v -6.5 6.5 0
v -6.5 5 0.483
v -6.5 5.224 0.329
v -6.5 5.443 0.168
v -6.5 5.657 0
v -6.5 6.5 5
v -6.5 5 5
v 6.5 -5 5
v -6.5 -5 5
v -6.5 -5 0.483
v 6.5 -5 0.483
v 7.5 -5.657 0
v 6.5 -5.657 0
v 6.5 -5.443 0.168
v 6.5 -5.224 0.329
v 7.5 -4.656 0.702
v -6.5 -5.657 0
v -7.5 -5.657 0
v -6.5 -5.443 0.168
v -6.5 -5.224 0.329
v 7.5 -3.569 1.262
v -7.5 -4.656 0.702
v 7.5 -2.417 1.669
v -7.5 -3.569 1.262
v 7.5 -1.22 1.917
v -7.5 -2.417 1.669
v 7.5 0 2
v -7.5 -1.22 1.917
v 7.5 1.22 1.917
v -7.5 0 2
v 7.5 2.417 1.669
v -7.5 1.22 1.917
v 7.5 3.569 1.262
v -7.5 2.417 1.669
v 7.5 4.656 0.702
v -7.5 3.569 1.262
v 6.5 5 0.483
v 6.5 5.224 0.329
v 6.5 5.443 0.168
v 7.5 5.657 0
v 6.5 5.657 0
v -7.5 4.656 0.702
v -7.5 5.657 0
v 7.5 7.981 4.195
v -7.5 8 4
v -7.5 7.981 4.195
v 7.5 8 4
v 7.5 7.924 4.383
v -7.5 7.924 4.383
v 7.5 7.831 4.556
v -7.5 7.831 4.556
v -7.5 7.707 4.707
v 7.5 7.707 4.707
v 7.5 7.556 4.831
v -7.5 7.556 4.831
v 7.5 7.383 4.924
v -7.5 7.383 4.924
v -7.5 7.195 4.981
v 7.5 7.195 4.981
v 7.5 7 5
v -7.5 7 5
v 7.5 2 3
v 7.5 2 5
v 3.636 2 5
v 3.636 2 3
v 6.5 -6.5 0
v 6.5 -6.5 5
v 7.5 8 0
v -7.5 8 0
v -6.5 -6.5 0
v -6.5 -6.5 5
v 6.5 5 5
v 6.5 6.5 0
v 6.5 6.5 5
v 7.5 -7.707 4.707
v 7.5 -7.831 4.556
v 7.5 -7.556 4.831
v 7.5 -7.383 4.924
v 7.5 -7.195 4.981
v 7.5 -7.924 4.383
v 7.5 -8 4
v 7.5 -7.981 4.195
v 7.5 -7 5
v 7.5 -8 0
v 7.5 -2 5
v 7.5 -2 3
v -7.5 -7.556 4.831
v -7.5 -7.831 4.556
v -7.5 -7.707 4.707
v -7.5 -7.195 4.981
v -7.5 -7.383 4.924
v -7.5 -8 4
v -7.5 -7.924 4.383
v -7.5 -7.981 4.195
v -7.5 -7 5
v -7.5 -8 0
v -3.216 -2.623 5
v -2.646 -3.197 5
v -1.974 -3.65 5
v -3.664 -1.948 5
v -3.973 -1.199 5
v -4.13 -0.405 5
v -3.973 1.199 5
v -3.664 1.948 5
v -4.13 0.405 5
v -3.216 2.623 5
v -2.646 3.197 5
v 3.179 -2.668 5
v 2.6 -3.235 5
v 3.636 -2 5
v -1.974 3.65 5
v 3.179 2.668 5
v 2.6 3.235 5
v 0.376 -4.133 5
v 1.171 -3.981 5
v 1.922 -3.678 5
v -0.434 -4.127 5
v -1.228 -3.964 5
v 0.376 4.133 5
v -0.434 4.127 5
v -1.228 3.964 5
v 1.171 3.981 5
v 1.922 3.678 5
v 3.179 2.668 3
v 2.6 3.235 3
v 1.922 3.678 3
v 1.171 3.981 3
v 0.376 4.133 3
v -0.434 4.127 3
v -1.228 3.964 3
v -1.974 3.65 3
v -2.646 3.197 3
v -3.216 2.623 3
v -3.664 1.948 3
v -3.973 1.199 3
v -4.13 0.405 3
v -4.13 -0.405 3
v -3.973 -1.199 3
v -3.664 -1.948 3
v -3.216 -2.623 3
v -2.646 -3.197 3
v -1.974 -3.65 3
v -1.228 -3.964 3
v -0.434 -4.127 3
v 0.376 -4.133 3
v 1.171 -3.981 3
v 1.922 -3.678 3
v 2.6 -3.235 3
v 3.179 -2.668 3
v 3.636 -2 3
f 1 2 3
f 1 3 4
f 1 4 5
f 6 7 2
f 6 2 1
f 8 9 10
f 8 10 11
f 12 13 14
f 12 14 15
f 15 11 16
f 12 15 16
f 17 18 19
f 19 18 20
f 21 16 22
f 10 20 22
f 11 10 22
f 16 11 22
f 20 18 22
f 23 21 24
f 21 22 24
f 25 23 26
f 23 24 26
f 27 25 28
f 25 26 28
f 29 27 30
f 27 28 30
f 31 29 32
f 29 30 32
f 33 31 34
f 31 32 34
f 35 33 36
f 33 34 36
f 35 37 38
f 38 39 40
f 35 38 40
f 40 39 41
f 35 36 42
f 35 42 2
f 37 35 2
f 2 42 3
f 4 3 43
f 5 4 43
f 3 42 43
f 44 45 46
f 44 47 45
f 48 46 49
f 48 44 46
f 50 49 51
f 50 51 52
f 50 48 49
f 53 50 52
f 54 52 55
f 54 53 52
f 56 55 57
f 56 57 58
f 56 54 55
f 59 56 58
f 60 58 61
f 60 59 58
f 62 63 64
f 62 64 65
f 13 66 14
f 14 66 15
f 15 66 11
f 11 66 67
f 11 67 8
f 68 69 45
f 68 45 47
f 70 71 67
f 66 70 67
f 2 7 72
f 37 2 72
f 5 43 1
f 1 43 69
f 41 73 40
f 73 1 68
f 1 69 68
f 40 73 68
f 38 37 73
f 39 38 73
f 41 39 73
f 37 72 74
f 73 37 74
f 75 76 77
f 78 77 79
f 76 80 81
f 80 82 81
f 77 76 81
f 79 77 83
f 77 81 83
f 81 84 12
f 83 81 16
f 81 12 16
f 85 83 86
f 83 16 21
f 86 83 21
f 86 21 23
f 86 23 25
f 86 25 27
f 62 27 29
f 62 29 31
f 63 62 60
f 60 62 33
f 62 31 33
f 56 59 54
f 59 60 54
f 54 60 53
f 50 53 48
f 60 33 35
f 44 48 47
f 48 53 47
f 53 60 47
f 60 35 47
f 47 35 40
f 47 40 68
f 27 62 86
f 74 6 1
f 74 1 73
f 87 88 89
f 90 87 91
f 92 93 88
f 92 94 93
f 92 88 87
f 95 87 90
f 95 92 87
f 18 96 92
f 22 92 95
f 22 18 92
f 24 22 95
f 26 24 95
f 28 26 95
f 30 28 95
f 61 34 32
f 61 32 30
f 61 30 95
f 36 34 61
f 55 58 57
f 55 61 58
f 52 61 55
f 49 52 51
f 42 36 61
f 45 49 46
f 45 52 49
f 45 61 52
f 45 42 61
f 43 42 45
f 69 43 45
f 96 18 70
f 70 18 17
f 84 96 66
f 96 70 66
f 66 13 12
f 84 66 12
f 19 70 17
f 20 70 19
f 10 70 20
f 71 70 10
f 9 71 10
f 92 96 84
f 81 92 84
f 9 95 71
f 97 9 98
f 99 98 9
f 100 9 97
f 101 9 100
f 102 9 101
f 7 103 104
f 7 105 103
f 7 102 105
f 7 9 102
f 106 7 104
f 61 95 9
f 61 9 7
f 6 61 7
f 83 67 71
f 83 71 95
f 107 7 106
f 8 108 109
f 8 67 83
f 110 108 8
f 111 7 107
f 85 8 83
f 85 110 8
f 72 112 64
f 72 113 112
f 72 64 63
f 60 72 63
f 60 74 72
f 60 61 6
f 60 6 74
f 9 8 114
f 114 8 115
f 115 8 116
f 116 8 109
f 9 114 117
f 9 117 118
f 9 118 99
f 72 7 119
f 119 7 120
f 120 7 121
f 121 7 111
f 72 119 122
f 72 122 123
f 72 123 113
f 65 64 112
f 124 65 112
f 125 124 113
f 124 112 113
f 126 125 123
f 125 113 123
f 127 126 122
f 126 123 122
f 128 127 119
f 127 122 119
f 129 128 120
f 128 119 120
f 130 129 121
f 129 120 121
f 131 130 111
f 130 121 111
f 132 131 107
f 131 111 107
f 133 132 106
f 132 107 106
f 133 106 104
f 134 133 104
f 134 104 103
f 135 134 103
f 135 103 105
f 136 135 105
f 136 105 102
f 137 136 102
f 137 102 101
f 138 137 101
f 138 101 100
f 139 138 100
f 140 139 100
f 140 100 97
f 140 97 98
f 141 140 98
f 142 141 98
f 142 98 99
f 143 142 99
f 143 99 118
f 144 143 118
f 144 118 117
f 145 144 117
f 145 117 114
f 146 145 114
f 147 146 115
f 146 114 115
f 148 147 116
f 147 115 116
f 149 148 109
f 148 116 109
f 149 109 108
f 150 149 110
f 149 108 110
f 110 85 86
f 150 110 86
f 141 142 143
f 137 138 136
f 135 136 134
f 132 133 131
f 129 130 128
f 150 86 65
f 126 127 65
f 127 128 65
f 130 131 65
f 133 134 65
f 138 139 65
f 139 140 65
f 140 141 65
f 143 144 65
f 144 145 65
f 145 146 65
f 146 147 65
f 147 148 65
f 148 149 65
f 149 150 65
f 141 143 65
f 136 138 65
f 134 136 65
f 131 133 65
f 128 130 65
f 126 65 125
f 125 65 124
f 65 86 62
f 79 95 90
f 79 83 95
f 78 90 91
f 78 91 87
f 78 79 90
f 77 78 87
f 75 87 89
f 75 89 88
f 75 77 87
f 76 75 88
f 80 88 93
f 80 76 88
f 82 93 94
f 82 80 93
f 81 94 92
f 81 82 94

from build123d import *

# Parameters (mm, degrees)
SKETCH1_W           = 15
SKETCH1_H           = 16
BOSS_EXTRUDE1_DEPTH = 5
SKETCH2_R           = 4.15
CUT_EXTRUDE1_DEPTH  = 2
SKETCH4_W           = 4
SKETCH4_H           = 4
CUT_EXTRUDE2_DEPTH  = 4
SKETCH8_W           = 13
SKETCH8_H           = 1.5
CUT_EXTRUDE4_DEPTH  = 10
SKETCH9_R           = 9
CUT_EXTRUDE6_DEPTH  = 50
FILLET2_R           = 1
FILLET3_R           = 1


with BuildPart() as part:
    # Sketch1 → Boss-Extrude1 (new body)
    with BuildSketch(Plane.XY):
        Rectangle(SKETCH1_W, SKETCH1_H)
    extrude(amount=BOSS_EXTRUDE1_DEPTH)

    # Sketch2 → Cut-Extrude1 (cut)
    with BuildSketch(Plane.XY.offset(5)):
        Circle(SKETCH2_R)
    extrude(amount=-CUT_EXTRUDE1_DEPTH, mode=Mode.SUBTRACT)

    # Sketch4 → Cut-Extrude2 (cut)
    with BuildSketch(Plane(origin=(7.5, 0, 0), x_dir=(0, 0, -1), z_dir=(1, 0, 0))):
        with Locations((-5, 0)):
            Rectangle(SKETCH4_W, SKETCH4_H)
    extrude(amount=-CUT_EXTRUDE2_DEPTH, mode=Mode.SUBTRACT)

    # Sketch8 → Cut-Extrude4 (cut)
    with BuildSketch(Plane.XY.offset(5)):
        with Locations((0, 5.75)):
            Rectangle(SKETCH8_W, SKETCH8_H)
        with Locations((0, -5.75)):
            Rectangle(SKETCH8_W, SKETCH8_H)
    extrude(amount=-CUT_EXTRUDE4_DEPTH, mode=Mode.SUBTRACT)

    # Sketch9 → Cut-Extrude6 (cut)
    with BuildSketch(Plane.ZY.offset(7.5)):
        with Locations((-7, 0)):
            Circle(SKETCH9_R)
    extrude(amount=-CUT_EXTRUDE6_DEPTH, mode=Mode.SUBTRACT)

    # Fillet2
    fillet2_edges = [part.edges().sort_by_distance(p)[0] for p in [
        (0, 8, 5),
    ]]
    fillet(fillet2_edges, radius=FILLET2_R)

    # Fillet3
    fillet3_edges = [part.edges().sort_by_distance(p)[0] for p in [
        (0, -8, 5),
    ]]
    fillet(fillet3_edges, radius=FILLET3_R)


solid = part.part
